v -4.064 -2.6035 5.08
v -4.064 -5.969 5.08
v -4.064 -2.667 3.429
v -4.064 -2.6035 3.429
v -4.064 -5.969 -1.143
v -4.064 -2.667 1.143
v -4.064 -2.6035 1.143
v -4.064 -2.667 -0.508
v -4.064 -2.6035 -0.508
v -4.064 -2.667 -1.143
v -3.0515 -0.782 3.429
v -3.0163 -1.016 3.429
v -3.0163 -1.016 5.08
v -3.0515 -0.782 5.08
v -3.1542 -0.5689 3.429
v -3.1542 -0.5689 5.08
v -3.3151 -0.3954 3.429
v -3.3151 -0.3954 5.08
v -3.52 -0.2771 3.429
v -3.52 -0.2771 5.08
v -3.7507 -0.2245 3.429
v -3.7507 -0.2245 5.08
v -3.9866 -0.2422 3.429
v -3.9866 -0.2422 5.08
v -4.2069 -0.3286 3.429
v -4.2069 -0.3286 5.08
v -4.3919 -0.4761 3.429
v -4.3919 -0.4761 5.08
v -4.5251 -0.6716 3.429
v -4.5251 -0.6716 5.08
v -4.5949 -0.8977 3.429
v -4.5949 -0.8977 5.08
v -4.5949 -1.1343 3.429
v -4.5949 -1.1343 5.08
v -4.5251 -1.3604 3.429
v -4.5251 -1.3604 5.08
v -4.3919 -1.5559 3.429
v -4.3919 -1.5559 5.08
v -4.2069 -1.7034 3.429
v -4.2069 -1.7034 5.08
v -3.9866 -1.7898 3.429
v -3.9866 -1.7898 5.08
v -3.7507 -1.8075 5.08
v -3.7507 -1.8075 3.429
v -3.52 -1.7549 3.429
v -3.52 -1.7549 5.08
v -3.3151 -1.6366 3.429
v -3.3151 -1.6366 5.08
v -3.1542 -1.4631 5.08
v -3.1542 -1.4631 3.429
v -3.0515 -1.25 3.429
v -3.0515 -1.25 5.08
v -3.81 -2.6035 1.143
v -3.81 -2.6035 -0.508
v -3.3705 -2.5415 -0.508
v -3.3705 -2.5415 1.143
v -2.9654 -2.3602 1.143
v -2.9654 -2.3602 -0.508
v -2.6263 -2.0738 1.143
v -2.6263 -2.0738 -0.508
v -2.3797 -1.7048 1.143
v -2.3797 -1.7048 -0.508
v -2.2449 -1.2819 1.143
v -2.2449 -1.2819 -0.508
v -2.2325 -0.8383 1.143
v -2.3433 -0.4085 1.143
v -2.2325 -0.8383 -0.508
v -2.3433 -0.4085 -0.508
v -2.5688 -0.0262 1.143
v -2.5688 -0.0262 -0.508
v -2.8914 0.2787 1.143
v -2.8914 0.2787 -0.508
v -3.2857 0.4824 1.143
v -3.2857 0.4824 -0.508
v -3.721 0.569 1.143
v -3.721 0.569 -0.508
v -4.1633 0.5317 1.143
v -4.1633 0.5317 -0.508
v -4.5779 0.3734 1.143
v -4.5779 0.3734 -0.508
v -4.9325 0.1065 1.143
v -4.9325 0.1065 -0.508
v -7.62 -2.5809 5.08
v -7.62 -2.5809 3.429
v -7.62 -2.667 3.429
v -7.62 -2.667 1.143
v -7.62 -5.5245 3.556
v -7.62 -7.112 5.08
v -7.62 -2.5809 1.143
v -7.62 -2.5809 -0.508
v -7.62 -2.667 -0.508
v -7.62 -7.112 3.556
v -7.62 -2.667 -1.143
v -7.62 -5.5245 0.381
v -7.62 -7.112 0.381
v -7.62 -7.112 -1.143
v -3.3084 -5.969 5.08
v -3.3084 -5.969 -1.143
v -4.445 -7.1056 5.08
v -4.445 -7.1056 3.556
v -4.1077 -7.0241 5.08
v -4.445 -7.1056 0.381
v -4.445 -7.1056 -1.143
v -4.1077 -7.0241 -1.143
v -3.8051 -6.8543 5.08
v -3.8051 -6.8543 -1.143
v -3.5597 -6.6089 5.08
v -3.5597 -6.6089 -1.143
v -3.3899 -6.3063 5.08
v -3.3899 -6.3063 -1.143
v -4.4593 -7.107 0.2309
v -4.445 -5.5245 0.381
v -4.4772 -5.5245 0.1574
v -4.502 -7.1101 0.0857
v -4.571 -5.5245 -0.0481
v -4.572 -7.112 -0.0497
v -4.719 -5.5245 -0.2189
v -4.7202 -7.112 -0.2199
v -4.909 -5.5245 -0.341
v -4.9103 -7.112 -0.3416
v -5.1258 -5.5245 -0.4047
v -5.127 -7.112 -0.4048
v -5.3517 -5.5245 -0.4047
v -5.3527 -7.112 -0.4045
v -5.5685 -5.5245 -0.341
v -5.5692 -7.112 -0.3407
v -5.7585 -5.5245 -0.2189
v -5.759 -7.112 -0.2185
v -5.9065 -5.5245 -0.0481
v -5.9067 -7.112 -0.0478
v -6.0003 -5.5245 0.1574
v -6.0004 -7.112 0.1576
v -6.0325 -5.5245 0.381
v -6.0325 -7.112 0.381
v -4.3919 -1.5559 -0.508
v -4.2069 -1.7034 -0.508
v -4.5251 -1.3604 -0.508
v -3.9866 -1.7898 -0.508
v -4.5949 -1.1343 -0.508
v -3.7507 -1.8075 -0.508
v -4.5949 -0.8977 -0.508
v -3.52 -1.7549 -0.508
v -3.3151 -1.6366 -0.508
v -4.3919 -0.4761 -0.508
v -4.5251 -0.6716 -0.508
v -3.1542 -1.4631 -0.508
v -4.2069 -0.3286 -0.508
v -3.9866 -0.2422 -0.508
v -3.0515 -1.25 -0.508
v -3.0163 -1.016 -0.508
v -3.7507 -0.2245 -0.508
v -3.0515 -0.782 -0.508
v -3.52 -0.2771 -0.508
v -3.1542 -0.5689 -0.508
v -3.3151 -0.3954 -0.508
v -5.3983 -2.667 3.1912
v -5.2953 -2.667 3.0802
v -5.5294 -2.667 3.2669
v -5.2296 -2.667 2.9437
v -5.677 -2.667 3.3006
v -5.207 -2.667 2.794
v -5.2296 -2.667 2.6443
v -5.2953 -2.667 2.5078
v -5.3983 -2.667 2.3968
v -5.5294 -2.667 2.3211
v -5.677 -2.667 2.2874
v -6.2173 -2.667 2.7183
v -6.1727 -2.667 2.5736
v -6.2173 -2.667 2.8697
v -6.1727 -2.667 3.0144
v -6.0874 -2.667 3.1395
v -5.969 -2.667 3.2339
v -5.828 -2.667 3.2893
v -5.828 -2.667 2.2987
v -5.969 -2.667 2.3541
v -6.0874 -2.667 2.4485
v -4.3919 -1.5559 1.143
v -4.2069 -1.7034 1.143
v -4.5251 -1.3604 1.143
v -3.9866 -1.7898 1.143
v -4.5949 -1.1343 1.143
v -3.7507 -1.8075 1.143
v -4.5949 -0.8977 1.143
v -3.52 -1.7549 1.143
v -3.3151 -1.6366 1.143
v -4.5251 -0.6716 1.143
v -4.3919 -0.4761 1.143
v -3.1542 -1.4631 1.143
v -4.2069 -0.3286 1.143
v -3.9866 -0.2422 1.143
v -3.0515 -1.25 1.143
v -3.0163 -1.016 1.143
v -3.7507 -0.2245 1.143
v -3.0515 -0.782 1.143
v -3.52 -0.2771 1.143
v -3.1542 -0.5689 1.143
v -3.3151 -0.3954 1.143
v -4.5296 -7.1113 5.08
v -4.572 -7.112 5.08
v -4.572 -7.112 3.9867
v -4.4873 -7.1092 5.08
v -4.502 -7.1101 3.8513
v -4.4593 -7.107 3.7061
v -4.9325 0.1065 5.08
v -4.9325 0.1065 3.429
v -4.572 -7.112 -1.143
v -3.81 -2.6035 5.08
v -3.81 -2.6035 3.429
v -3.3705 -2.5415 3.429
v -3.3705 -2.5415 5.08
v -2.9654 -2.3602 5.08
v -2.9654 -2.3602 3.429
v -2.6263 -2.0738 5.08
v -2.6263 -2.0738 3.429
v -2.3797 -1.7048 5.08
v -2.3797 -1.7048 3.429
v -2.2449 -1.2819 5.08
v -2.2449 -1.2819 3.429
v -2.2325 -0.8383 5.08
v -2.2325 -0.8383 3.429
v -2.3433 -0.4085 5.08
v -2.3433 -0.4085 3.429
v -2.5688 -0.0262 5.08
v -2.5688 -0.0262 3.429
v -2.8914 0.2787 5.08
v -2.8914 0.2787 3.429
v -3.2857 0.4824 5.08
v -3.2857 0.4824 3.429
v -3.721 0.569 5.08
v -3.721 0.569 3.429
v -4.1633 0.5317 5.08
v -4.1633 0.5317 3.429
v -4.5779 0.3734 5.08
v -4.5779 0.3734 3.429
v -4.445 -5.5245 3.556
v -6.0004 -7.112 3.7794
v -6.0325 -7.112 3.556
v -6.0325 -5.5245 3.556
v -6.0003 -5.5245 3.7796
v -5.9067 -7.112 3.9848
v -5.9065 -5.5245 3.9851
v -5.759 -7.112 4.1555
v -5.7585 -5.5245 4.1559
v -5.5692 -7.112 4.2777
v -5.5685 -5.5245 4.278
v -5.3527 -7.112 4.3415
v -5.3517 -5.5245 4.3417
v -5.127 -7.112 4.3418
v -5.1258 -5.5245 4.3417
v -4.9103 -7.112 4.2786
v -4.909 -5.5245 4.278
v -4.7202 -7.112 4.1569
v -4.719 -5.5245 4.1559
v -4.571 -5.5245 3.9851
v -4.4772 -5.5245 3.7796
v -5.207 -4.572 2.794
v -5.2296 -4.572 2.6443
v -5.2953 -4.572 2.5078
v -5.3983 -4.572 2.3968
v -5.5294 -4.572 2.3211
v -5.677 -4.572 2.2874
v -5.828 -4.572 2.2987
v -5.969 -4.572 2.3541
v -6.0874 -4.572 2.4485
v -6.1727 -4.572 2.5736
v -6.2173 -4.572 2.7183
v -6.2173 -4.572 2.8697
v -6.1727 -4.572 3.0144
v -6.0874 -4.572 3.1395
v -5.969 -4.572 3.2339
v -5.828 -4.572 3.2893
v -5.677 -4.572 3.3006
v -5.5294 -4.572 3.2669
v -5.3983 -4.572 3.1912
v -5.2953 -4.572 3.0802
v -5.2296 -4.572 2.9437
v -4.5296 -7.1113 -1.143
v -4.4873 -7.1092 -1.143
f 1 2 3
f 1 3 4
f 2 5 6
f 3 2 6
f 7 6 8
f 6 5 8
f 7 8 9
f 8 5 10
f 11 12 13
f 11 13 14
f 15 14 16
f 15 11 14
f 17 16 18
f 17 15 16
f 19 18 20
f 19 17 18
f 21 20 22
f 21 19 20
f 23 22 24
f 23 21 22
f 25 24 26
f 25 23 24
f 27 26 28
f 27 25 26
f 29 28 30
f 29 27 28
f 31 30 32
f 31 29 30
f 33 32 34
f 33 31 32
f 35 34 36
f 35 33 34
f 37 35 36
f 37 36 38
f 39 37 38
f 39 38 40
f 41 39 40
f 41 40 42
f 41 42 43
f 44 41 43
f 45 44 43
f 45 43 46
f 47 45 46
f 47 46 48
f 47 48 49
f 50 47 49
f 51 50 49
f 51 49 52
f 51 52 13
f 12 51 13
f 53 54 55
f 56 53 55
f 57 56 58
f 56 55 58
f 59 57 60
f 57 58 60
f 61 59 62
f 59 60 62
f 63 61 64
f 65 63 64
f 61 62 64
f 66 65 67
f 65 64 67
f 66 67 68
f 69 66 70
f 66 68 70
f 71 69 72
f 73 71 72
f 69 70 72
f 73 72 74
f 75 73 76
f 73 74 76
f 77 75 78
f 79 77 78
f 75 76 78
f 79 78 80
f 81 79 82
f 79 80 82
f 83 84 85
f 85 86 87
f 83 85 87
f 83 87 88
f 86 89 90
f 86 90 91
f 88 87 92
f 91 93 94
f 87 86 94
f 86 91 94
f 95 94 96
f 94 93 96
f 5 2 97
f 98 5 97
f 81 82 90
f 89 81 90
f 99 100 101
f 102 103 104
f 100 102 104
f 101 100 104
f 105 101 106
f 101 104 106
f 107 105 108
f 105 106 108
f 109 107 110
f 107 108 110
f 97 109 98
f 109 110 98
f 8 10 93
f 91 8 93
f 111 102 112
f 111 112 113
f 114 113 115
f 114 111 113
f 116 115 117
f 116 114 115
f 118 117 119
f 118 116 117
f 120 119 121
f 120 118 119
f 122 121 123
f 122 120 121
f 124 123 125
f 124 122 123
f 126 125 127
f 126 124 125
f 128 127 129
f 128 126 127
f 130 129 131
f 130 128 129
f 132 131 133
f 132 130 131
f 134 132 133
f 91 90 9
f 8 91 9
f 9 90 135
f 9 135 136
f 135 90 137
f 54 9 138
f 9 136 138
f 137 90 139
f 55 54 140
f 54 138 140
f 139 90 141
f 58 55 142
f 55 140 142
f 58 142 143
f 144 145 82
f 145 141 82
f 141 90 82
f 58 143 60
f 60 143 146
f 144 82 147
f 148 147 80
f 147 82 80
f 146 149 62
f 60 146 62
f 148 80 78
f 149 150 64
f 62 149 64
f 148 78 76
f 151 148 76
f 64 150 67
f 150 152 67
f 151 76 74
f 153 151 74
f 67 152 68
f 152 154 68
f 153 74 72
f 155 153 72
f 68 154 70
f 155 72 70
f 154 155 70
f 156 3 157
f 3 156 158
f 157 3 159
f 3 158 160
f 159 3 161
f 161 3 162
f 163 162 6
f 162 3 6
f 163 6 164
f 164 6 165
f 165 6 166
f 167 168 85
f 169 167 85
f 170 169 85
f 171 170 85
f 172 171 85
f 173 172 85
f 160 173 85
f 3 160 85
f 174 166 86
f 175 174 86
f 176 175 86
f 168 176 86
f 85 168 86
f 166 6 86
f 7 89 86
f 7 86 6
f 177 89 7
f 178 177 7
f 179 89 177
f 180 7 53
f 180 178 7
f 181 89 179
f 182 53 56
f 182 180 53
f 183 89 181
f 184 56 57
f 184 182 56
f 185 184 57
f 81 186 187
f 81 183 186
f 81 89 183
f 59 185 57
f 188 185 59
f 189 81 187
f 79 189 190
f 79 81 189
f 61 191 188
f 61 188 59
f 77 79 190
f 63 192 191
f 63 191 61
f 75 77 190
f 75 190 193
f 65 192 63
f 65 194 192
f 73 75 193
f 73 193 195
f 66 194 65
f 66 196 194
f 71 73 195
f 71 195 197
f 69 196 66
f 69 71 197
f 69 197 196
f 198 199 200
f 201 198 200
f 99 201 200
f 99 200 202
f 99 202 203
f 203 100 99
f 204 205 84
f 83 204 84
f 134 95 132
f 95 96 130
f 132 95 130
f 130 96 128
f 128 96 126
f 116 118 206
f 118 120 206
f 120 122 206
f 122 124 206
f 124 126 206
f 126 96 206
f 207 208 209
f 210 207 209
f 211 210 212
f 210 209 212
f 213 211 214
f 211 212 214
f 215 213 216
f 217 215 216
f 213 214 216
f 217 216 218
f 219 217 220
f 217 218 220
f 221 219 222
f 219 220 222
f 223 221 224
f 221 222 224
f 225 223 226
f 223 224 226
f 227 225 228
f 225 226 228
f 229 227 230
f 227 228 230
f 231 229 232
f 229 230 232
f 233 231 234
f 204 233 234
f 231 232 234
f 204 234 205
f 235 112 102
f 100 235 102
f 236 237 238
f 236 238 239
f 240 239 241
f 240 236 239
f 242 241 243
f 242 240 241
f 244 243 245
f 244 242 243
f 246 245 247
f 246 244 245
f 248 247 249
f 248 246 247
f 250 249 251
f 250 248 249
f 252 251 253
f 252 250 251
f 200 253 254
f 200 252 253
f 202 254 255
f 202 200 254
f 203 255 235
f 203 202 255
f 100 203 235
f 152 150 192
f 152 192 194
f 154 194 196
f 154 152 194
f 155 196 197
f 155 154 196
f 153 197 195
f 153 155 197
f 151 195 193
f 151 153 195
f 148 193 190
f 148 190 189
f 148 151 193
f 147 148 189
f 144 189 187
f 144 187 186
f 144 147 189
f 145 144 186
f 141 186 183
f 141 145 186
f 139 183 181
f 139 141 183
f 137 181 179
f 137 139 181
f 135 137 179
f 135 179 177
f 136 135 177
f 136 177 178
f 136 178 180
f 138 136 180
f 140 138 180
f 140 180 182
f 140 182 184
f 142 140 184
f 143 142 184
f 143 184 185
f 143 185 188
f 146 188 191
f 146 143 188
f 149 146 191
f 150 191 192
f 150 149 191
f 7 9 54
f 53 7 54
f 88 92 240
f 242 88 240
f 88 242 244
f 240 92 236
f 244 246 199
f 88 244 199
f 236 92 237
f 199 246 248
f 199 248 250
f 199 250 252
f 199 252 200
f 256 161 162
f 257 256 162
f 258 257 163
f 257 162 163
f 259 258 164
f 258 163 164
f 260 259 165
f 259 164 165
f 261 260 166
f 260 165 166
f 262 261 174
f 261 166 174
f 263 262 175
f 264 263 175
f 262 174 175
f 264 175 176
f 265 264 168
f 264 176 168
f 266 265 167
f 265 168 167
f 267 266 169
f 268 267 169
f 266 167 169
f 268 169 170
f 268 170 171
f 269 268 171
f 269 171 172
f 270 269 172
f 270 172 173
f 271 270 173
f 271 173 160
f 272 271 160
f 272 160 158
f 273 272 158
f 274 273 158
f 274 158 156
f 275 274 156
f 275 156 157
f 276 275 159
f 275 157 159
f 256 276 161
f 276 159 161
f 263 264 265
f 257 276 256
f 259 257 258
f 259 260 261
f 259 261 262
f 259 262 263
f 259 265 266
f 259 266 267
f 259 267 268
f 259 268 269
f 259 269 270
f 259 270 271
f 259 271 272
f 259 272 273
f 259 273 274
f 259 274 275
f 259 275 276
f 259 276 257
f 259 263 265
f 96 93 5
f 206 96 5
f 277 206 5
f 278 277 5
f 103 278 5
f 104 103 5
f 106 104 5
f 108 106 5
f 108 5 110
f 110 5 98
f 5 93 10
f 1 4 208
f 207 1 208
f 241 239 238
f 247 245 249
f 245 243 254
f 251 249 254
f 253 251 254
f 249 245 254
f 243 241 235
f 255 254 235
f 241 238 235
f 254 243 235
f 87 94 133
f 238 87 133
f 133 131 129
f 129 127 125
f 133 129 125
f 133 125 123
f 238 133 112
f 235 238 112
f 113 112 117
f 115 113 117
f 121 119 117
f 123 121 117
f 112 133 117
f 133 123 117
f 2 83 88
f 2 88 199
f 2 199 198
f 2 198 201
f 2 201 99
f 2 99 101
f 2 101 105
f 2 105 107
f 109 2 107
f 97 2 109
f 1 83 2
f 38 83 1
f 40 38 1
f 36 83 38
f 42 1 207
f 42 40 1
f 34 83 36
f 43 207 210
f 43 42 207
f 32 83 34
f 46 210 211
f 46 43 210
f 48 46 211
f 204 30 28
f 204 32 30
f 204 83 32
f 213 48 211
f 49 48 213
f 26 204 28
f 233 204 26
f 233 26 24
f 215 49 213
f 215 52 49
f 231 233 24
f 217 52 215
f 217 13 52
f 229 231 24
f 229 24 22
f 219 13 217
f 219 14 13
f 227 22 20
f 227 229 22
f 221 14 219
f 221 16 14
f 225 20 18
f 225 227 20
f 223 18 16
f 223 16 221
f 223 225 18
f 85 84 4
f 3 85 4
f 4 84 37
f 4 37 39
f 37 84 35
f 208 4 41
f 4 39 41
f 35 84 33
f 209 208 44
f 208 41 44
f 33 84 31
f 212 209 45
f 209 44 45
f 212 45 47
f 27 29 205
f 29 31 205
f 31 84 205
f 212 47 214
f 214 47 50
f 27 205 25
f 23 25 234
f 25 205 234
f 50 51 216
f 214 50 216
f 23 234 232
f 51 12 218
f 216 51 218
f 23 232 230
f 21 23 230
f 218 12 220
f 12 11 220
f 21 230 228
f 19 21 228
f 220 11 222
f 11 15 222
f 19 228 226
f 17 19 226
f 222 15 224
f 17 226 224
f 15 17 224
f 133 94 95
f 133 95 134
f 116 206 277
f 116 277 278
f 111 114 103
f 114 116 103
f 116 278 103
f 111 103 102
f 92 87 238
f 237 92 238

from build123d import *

# Parameters (mm, degrees)
OUTER_START                           = -1.143
OUTER_CLAMP_LATCH_FILLET1_DEPTH       = 6.223
OUTER_START_2                         = 3.556
OUTER_CLAMP_LATCH_FILLET1_2_OUTLINE_R = 0.79375
OUTER_CLAMP_LATCH_FILLET1_2_DEPTH     = 1.524
OUTER_START_3                         = -0.508
OUTER_CLAMP_LATCH_FILLET1_3_OUTLINE_R = 0.79375
OUTER_CLAMP_LATCH_FILLET1_3_DEPTH     = 1.651
OUTER_CLAMP_LATCH_FILLET1_4_DEPTH     = 1.524
OUTER_START_4                         = 3.429
OUTER_CLAMP_LATCH_FILLET1_5_OUTLINE_R = 0.79375
OUTER_CLAMP_LATCH_FILLET1_5_DEPTH     = 0.127
OUTER_START_5                         = -7.112
OUTER_CLAMP_LATCH_FILLET1_6_DEPTH     = 1.5875
OUTER_START_6                         = -5.207
OUTER_CLAMP_LATCH_FILLET1_7_OUTLINE_R = 0.508
OUTER_CLAMP_LATCH_FILLET1_7_DEPTH     = 2.54
SKETCH1_W                             = 0.762
SKETCH1_H                             = 1.651
CUT_EXTRUDE1_DEPTH                    = 13.139632435
EXTRUDE1_START                        = -2.8575
SKETCH2_R                             = 0.508
EXTRUDE1_DEPTH                        = 2.8575
SKETCH2_3_R                           = 0.508
CUT_EXTRUDE2_DEPTH                    = 1.905


with BuildPart() as part:
    # <Outer Clamp Latch>-<Fillet1>: read off the stored shape, not the designer's step
    # <Outer Clamp Latch>-<Fillet1> outline → <Outer Clamp Latch>-<Fillet1> (new body)
    with BuildSketch(Plane.XY.offset(OUTER_START)):
        with BuildLine():
            Line((-4.445, -5.5245), (-4.445, -7.105634045))
            ThreePointArc((-4.445, -7.105634045), (-3.630142792, -6.693941899), (-3.302, -5.842))
            Line((-3.302, -5.842), (-3.302, -4.318))
            Line((-3.302, -4.318), (-4.064, -4.318))
            Line((-4.064, -4.318), (-4.064, -2.667))
            Line((-4.064, -2.667), (-7.62, -2.667))
            Line((-7.62, -2.667), (-7.62, -5.5245))
            Line((-7.62, -5.5245), (-4.445, -5.5245))
        make_face()
    extrude(amount=OUTER_CLAMP_LATCH_FILLET1_DEPTH)

    # Outer Clamp Latch_-_Fillet1 2 outline → Outer Clamp Latch_-_Fillet1 2 (add)
    # profile 1 of 2: a face of its own
    with BuildSketch(Plane.XY.offset(OUTER_START_2)):
        with BuildLine():
            Line((-7.62, -7.112), (-4.572, -7.112))
            ThreePointArc((-4.572, -7.112), (-4.508420276, -7.110407513), (-4.445, -7.105634045))
            Line((-4.445, -7.105634045), (-4.445, -5.5245))
            Line((-4.445, -5.5245), (-7.62, -5.5245))
            Line((-7.62, -5.5245), (-7.62, -7.112))
        make_face()
    # profile 2 of 2: a face of its own
    with BuildSketch(Plane.XY.offset(OUTER_START_2)):
        with BuildLine():
            Line((-7.62, -2.58093597), (-7.62, -2.667))
            Line((-7.62, -2.667), (-4.064, -2.667))
            Line((-4.064, -2.667), (-4.064, -2.6035))
            Line((-4.064, -2.6035), (-3.81, -2.6035))
            ThreePointArc((-3.81, -2.6035), (-2.343341242, -0.408490051), (-4.932532015, 0.106532015))
            Line((-4.932532015, 0.106532015), (-7.62, -2.58093597))
        make_face()
        with Locations((-3.81, -1.016)):
            Circle(OUTER_CLAMP_LATCH_FILLET1_2_OUTLINE_R, mode=Mode.SUBTRACT)
    extrude(amount=OUTER_CLAMP_LATCH_FILLET1_2_DEPTH)

    # Outer Clamp Latch_-_Fillet1 3 outline → Outer Clamp Latch_-_Fillet1 3 (add)
    with BuildSketch(Plane.XY.offset(OUTER_START_3)):
        with BuildLine():
            Line((-7.62, -2.58093597), (-7.62, -2.667))
            Line((-7.62, -2.667), (-4.064, -2.667))
            Line((-4.064, -2.667), (-4.064, -2.6035))
            Line((-4.064, -2.6035), (-3.81, -2.6035))
            ThreePointArc((-3.81, -2.6035), (-2.343341242, -0.408490051), (-4.932532015, 0.106532015))
            Line((-4.932532015, 0.106532015), (-7.62, -2.58093597))
        make_face()
        with Locations((-3.81, -1.016)):
            Circle(OUTER_CLAMP_LATCH_FILLET1_3_OUTLINE_R, mode=Mode.SUBTRACT)
    extrude(amount=OUTER_CLAMP_LATCH_FILLET1_3_DEPTH)

    # Outer Clamp Latch_-_Fillet1 4 outline → Outer Clamp Latch_-_Fillet1 4 (add)
    with BuildSketch(Plane.XY.offset(OUTER_START)):
        with BuildLine():
            Line((-7.62, -7.112), (-4.572, -7.112))
            ThreePointArc((-4.572, -7.112), (-4.508420276, -7.110407513), (-4.445, -7.105634045))
            Line((-4.445, -7.105634045), (-4.445, -5.5245))
            Line((-4.445, -5.5245), (-7.62, -5.5245))
            Line((-7.62, -5.5245), (-7.62, -7.112))
        make_face()
    extrude(amount=OUTER_CLAMP_LATCH_FILLET1_4_DEPTH)

    # Outer Clamp Latch_-_Fillet1 5 outline → Outer Clamp Latch_-_Fillet1 5 (add)
    with BuildSketch(Plane.XY.offset(OUTER_START_4)):
        with BuildLine():
            Line((-7.62, -2.58093597), (-7.62, -2.667))
            Line((-7.62, -2.667), (-4.064, -2.667))
            Line((-4.064, -2.667), (-4.064, -2.6035))
            Line((-4.064, -2.6035), (-3.81, -2.6035))
            ThreePointArc((-3.81, -2.6035), (-2.343341242, -0.408490051), (-4.932532015, 0.106532015))
            Line((-4.932532015, 0.106532015), (-7.62, -2.58093597))
        make_face()
        with Locations((-3.81, -1.016)):
            Circle(OUTER_CLAMP_LATCH_FILLET1_5_OUTLINE_R, mode=Mode.SUBTRACT)
    extrude(amount=OUTER_CLAMP_LATCH_FILLET1_5_DEPTH)

    # Outer Clamp Latch_-_Fillet1 6 outline → Outer Clamp Latch_-_Fillet1 6 (cut)
    with BuildSketch(Plane(origin=(0, 0, 0), x_dir=(1, 0, 0), z_dir=(0, 1, 0)).offset(OUTER_START_5)):
        with BuildLine():
            ThreePointArc((-4.445, -0.381), (-5.23875, 0.41275), (-6.0325, -0.381))
            Line((-6.0325, -0.381), (-4.445, -0.381))
        make_face()
        with BuildLine():
            ThreePointArc((-6.0325, -3.556), (-5.23875, -4.34975), (-4.445, -3.556))
            Line((-4.445, -3.556), (-6.0325, -3.556))
        make_face()
    extrude(amount=OUTER_CLAMP_LATCH_FILLET1_6_DEPTH, mode=Mode.SUBTRACT)

    # Outer Clamp Latch_-_Fillet1 7 outline → Outer Clamp Latch_-_Fillet1 7 (cut)
    with BuildSketch(Plane(origin=(0, 0, 0), x_dir=(1, 0, 0), z_dir=(0, 1, 0)).offset(OUTER_START_6)):
        with Locations((-5.715, -1.778)):
            Circle(OUTER_CLAMP_LATCH_FILLET1_7_OUTLINE_R)
    extrude(amount=OUTER_CLAMP_LATCH_FILLET1_7_DEPTH, mode=Mode.SUBTRACT)

    # Sketch1 → Cut-Extrude1 (cut, through all)
    with BuildSketch(Plane.XY.offset(5.08)):
        with Locations((-3.683, -5.1435)):
            Rectangle(SKETCH1_W, SKETCH1_H)
    extrude(amount=-CUT_EXTRUDE1_DEPTH, mode=Mode.SUBTRACT)

    # Sketch2 → Extrude1 (add)
    with BuildSketch(Plane(origin=(0, -2.667, 0), x_dir=(-1, 0, 0), z_dir=(0, 1, 0)).offset(EXTRUDE1_START)):
        with Locations((5.715, 2.794)):
            Circle(SKETCH2_R)
        with Locations((5.715, 1.778)):
            Circle(SKETCH2_R)
    extrude(amount=EXTRUDE1_DEPTH)

    # Sketch2<3> → Cut-Extrude2 (cut)
    with BuildSketch(Plane(origin=(0, -2.667, 0), x_dir=(-1, 0, 0), z_dir=(0, 1, 0))):
        with Locations(Location((5.715, 2.794, 0), (0, 0, 180))):
            Circle(SKETCH2_3_R)
    extrude(amount=-CUT_EXTRUDE2_DEPTH, mode=Mode.SUBTRACT)


solid = part.part
